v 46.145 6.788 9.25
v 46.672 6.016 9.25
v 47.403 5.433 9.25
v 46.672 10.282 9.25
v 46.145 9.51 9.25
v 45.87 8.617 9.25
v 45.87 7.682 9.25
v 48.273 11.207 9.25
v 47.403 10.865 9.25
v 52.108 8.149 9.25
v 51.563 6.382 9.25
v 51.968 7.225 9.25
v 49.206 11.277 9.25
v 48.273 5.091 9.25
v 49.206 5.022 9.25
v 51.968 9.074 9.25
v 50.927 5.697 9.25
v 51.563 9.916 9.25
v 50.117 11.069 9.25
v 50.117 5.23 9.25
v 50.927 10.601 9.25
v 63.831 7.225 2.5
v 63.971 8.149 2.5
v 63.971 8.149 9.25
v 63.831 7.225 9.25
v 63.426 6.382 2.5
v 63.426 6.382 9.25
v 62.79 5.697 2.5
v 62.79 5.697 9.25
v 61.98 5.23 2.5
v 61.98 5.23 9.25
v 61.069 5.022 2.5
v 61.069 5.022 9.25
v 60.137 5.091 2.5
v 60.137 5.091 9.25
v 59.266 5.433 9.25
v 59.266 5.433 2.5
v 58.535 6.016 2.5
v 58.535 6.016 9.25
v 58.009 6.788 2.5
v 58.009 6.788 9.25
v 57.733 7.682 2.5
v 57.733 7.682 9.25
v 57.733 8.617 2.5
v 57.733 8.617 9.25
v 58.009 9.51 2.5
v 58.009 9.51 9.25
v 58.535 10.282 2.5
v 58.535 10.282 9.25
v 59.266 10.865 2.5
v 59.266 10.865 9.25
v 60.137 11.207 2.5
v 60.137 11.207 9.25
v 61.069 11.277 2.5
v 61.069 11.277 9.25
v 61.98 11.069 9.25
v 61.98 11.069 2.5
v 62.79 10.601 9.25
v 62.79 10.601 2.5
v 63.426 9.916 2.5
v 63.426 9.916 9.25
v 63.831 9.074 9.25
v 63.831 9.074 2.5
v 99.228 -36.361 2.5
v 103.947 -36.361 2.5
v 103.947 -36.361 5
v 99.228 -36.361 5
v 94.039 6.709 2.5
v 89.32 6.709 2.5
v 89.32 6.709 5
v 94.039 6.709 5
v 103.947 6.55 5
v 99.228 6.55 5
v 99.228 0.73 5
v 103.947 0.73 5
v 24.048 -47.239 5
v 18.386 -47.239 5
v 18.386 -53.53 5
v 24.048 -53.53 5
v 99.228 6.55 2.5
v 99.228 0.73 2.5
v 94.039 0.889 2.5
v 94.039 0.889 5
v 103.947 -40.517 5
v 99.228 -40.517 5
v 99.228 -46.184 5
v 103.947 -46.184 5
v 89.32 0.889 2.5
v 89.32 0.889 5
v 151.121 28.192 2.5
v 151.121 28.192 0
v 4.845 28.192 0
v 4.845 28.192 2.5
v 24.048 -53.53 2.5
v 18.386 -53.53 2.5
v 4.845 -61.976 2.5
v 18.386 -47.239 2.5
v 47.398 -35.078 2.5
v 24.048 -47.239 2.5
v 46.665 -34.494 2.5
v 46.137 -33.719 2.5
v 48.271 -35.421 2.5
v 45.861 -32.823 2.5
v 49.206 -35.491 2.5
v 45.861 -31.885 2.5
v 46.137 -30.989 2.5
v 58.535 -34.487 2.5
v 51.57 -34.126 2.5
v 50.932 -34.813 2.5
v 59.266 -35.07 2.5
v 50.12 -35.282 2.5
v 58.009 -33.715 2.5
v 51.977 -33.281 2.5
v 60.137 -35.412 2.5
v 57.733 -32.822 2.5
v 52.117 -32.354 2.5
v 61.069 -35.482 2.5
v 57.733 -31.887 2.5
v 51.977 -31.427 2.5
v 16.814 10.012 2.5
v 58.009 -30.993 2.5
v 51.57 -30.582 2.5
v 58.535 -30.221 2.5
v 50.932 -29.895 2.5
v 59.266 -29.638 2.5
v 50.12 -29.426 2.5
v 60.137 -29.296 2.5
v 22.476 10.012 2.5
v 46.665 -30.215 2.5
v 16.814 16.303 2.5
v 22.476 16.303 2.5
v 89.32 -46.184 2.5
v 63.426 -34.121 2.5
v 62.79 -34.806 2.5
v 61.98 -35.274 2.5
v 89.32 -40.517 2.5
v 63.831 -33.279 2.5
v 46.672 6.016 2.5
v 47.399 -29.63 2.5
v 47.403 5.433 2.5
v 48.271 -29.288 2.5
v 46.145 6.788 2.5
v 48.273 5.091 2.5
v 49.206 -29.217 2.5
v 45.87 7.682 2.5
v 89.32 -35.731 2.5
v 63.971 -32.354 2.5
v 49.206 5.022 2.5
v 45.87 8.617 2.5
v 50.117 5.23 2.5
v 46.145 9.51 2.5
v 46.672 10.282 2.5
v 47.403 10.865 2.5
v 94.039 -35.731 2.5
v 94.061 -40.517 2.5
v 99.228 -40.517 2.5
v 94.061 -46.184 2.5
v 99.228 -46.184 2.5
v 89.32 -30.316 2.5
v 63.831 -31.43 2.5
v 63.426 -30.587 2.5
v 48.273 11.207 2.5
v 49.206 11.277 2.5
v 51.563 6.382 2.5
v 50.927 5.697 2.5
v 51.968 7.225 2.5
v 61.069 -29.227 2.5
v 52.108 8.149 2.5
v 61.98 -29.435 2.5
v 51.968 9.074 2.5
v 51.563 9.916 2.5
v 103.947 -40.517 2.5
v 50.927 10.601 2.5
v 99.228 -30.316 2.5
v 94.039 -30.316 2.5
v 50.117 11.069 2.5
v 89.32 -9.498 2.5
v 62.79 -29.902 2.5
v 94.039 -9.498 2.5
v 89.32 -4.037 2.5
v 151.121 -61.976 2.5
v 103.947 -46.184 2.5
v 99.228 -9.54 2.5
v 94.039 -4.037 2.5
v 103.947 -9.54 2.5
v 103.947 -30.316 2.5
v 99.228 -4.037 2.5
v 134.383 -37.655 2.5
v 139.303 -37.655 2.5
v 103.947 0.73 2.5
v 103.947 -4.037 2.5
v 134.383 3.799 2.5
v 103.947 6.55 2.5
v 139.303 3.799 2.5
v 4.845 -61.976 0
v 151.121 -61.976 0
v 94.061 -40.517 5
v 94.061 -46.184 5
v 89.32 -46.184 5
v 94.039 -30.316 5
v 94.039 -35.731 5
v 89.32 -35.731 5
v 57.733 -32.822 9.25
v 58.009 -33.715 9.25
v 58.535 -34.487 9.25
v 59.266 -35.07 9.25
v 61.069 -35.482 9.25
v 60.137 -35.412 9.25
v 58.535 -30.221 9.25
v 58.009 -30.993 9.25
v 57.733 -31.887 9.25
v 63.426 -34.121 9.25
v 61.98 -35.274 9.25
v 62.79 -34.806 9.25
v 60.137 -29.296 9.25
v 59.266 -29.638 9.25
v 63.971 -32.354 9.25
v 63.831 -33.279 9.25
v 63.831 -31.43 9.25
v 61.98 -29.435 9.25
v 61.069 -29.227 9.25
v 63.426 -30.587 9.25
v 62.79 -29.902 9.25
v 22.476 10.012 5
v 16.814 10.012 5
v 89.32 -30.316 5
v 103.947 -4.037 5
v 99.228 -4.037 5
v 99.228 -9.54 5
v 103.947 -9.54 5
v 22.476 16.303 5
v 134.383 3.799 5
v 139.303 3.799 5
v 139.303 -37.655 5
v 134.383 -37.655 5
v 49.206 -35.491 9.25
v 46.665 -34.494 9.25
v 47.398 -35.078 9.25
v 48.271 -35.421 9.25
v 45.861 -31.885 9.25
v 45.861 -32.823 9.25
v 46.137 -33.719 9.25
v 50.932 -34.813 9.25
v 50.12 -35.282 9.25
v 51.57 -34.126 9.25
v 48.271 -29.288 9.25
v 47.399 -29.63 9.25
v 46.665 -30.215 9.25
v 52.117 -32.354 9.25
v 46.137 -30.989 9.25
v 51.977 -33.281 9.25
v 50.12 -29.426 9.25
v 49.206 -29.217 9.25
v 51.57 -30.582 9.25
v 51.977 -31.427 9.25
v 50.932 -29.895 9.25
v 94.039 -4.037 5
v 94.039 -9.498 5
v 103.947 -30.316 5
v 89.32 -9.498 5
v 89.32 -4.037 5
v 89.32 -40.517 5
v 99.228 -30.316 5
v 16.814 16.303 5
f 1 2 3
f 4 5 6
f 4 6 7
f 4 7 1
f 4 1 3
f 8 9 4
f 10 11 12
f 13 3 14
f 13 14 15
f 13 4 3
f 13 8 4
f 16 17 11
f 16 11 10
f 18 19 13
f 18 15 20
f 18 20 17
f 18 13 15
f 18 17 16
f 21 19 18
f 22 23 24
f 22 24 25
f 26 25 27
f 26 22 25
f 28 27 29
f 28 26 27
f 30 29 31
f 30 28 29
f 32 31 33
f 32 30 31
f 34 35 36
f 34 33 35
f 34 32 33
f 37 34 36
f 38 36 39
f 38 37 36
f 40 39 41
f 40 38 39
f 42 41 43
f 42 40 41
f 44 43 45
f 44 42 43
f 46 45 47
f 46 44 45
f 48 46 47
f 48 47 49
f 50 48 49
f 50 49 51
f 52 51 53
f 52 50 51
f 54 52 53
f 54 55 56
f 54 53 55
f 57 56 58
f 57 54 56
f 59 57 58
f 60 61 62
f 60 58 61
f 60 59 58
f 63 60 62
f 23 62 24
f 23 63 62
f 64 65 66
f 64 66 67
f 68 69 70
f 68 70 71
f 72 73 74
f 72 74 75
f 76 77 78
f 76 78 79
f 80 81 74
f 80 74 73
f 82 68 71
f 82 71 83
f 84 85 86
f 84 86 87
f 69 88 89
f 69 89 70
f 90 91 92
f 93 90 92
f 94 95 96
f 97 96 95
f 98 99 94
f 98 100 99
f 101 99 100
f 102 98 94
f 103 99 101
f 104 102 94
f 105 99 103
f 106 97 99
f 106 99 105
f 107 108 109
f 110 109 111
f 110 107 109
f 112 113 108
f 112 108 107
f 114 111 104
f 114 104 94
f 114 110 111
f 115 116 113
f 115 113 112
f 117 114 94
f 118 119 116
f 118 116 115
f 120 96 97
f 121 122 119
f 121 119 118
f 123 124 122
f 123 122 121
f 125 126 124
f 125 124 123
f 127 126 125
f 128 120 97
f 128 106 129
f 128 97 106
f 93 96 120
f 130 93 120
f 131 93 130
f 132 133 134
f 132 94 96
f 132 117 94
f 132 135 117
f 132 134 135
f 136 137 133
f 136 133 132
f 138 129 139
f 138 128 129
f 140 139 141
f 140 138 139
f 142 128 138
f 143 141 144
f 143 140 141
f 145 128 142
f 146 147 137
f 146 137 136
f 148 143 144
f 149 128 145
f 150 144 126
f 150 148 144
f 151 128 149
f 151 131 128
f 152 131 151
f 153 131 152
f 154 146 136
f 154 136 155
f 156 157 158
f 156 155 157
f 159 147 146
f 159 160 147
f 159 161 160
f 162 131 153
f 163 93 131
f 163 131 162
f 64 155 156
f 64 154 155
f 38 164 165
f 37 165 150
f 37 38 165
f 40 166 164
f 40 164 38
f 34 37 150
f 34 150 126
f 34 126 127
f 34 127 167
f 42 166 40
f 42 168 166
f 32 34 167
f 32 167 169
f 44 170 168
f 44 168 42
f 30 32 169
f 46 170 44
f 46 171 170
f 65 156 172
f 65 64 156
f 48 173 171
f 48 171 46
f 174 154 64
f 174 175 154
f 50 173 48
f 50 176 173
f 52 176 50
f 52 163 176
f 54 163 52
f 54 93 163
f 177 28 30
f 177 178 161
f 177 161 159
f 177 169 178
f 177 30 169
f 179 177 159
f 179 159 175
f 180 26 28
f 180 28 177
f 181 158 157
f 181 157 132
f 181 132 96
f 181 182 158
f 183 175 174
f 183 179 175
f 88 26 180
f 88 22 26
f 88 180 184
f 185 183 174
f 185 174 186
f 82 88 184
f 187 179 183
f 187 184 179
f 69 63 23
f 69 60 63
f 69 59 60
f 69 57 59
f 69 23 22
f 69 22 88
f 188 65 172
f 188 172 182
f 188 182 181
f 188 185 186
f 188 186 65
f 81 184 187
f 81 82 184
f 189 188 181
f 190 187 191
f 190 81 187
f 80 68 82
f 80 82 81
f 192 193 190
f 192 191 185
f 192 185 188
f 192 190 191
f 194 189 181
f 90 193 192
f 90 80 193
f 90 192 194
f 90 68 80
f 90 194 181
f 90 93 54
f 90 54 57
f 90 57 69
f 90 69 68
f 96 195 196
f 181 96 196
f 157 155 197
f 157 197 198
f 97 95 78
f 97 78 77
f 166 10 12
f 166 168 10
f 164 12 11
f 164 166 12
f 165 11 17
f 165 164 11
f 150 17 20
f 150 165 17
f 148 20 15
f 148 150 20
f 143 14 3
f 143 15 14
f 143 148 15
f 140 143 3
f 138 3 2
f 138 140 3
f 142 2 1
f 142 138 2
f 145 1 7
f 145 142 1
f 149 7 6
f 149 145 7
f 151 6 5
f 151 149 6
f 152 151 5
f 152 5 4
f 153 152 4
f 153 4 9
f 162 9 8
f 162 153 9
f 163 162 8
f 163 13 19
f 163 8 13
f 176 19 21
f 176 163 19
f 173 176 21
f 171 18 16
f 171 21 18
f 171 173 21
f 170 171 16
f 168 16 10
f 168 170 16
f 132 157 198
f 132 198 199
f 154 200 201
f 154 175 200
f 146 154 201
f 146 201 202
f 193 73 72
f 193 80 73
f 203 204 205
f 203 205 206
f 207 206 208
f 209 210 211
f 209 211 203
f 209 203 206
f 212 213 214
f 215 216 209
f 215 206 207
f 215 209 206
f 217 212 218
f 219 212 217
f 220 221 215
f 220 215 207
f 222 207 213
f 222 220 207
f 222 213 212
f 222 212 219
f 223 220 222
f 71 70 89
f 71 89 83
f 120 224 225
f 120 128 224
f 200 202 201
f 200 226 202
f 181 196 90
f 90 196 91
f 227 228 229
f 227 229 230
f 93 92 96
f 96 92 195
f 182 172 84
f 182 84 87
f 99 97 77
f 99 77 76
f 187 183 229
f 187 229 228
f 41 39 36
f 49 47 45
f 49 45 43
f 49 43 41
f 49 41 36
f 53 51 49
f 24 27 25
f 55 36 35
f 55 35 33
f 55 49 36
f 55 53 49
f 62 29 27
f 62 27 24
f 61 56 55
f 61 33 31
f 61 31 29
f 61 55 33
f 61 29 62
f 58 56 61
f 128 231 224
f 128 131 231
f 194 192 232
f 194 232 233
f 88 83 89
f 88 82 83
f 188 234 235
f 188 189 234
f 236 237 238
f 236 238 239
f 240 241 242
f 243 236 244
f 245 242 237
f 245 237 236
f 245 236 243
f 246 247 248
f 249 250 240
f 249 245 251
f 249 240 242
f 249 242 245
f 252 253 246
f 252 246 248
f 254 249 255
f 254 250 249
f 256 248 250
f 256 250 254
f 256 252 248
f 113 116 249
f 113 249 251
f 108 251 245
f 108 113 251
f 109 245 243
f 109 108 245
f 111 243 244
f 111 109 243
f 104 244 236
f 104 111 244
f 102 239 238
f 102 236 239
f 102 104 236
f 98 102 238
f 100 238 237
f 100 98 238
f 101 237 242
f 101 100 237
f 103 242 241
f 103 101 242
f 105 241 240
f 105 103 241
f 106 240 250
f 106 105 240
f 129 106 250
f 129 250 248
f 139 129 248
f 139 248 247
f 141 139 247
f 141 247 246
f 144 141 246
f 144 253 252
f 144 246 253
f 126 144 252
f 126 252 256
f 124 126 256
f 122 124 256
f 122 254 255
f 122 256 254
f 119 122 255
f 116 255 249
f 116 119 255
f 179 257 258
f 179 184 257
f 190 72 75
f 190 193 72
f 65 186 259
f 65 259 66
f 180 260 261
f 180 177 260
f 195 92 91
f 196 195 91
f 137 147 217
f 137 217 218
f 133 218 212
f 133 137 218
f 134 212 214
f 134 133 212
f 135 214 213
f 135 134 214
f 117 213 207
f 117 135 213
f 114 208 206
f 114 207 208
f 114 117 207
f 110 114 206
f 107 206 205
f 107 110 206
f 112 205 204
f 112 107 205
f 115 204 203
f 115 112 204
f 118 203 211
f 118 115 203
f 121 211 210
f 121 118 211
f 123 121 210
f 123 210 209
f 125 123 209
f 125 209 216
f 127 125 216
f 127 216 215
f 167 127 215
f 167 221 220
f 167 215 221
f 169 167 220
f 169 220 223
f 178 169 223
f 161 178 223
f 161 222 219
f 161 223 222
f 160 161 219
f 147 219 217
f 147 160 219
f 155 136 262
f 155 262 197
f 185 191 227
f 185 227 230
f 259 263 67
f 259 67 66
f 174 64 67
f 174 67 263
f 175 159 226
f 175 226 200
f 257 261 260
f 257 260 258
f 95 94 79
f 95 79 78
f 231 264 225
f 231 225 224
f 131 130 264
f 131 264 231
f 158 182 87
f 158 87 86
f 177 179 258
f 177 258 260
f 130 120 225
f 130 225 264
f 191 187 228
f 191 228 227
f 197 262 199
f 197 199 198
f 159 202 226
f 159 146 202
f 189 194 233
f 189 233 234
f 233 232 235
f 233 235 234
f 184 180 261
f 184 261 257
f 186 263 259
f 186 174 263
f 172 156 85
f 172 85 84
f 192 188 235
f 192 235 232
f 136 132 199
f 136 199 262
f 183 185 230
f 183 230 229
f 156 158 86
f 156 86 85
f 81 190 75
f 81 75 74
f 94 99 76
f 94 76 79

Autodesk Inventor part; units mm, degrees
ref_plane "YZ Plane" through (0, 0, 0) normal (1, 0, 0) x (0, 1, 0)
ref_plane "XZ Plane" through (0, 0, 0) normal (0, 1, 0) x (-1, 0, 0)
ref_plane "XY Plane" through (0, 0, 0) normal (0, 0, 1) x (1, 0, 0)
sketch "Sketch1" plane through (0, 0, 0) normal (0, 0, 1) x (1, 0, 0)
  line L0 (151.1214, 28.1918) -> (4.845, 28.1918)
  line L1 (4.845, 28.1918) -> (4.845, -61.9764)
  line L2 (4.845, -61.9764) -> (151.1214, -61.9764)
  line L3 (151.1214, -61.9764) -> (151.1214, 28.1918)
  point P0 (0, 0)
extrude "Extrusion1" add sketch "Sketch1" along normal blind 2.5
sketch "Sketch2" plane through (0, 0, 2.5) normal (0, 0, 1) x (1, 0, 0)
  line L0 (16.8135, 16.3028) -> (22.4756, 16.3028)
  line L1 (22.4756, 16.3028) -> (22.4756, 10.0115)
  line L2 (22.4756, 10.0115) -> (16.8135, 10.0115)
  line L3 (16.8135, 10.0115) -> (16.8135, 16.3028)
  line L4 (18.3863, -47.2391) -> (24.0485, -47.2391)
  line L5 (24.0485, -47.2391) -> (24.0485, -53.5303)
  line L6 (24.0485, -53.5303) -> (18.3863, -53.5303)
  line L7 (18.3863, -53.5303) -> (18.3863, -47.2391)
  line L8 (89.3205, 6.7086) -> (94.0389, 6.7086)
  line L9 (94.0389, 6.7086) -> (94.0389, 0.8892)
  line L10 (94.0389, 0.8892) -> (89.3205, 0.8892)
  line L11 (89.3205, 0.8892) -> (89.3205, 6.7086)
  line L12 (99.2282, 6.5498) -> (103.9467, 6.5498)
  line L13 (103.9467, 6.5498) -> (103.9467, 0.7304)
  line L14 (103.9467, 0.7304) -> (99.2282, 0.7304)
  line L15 (99.2282, 0.7304) -> (99.2282, 6.5498)
  line L16 (89.3205, -4.037) -> (94.0389, -4.037)
  line L17 (94.0389, -4.037) -> (94.0389, -9.4978)
  line L18 (94.0389, -9.4978) -> (89.3205, -9.4978)
  line L19 (89.3205, -9.4978) -> (89.3205, -4.037)
  line L20 (99.2282, -4.037) -> (103.9467, -4.037)
  line L21 (103.9467, -4.037) -> (103.9467, -9.5401)
  line L22 (103.9467, -9.5401) -> (99.2282, -9.5401)
  line L23 (99.2282, -9.5401) -> (99.2282, -4.037)
  line L24 (134.3826, 3.7989) -> (139.3028, 3.7989)
  line L25 (139.3028, 3.7989) -> (139.3028, -37.6548)
  line L26 (139.3028, -37.6548) -> (134.3826, -37.6548)
  line L27 (134.3826, -37.6548) -> (134.3826, 3.7989)
  line L28 (89.3205, -30.3157) -> (94.0389, -30.3157)
  line L29 (94.0389, -30.3157) -> (94.0389, -35.7312)
  line L30 (94.0389, -35.7312) -> (89.3205, -35.7312)
  line L31 (89.3205, -35.7312) -> (89.3205, -30.3157)
  line L32 (99.2282, -30.3157) -> (103.9467, -30.3157)
  line L33 (103.9467, -30.3157) -> (103.9467, -36.3609)
  line L34 (103.9467, -36.3609) -> (99.2282, -36.3609)
  line L35 (99.2282, -36.3609) -> (99.2282, -30.3157)
  line L36 (99.2282, -40.517) -> (103.9467, -40.517)
  line L37 (103.9467, -40.517) -> (103.9467, -46.1844)
  line L38 (103.9467, -46.1844) -> (99.2282, -46.1844)
  line L39 (99.2282, -46.1844) -> (99.2282, -40.517)
  line L40 (89.3205, -40.517) -> (94.0614, -40.517)
  line L41 (94.0614, -40.517) -> (94.0614, -46.1844)
  line L42 (94.0614, -46.1844) -> (89.3205, -46.1844)
  line L43 (89.3205, -46.1844) -> (89.3205, -40.517)
  point P0 (0, 0)
extrude "Extrusion2" add sketch "Sketch2" along normal blind 2.5
sketch "Sketch3" plane through (0, 0, 2.5) normal (0, 0, 1) x (1, 0, 0)
  circle A0 centre (48.9712, 8.1491) radius 3.1363
  circle A1 centre (60.8345, 8.1491) radius 3.1363
  circle A2 centre (48.9712, -32.3541) radius 3.1454
  circle A3 centre (60.8345, -32.3541) radius 3.1363
  point P0 (0, 0)
extrude "Extrusion3" add sketch "Sketch3" along normal blind 6.75
properties part number "pcb"
